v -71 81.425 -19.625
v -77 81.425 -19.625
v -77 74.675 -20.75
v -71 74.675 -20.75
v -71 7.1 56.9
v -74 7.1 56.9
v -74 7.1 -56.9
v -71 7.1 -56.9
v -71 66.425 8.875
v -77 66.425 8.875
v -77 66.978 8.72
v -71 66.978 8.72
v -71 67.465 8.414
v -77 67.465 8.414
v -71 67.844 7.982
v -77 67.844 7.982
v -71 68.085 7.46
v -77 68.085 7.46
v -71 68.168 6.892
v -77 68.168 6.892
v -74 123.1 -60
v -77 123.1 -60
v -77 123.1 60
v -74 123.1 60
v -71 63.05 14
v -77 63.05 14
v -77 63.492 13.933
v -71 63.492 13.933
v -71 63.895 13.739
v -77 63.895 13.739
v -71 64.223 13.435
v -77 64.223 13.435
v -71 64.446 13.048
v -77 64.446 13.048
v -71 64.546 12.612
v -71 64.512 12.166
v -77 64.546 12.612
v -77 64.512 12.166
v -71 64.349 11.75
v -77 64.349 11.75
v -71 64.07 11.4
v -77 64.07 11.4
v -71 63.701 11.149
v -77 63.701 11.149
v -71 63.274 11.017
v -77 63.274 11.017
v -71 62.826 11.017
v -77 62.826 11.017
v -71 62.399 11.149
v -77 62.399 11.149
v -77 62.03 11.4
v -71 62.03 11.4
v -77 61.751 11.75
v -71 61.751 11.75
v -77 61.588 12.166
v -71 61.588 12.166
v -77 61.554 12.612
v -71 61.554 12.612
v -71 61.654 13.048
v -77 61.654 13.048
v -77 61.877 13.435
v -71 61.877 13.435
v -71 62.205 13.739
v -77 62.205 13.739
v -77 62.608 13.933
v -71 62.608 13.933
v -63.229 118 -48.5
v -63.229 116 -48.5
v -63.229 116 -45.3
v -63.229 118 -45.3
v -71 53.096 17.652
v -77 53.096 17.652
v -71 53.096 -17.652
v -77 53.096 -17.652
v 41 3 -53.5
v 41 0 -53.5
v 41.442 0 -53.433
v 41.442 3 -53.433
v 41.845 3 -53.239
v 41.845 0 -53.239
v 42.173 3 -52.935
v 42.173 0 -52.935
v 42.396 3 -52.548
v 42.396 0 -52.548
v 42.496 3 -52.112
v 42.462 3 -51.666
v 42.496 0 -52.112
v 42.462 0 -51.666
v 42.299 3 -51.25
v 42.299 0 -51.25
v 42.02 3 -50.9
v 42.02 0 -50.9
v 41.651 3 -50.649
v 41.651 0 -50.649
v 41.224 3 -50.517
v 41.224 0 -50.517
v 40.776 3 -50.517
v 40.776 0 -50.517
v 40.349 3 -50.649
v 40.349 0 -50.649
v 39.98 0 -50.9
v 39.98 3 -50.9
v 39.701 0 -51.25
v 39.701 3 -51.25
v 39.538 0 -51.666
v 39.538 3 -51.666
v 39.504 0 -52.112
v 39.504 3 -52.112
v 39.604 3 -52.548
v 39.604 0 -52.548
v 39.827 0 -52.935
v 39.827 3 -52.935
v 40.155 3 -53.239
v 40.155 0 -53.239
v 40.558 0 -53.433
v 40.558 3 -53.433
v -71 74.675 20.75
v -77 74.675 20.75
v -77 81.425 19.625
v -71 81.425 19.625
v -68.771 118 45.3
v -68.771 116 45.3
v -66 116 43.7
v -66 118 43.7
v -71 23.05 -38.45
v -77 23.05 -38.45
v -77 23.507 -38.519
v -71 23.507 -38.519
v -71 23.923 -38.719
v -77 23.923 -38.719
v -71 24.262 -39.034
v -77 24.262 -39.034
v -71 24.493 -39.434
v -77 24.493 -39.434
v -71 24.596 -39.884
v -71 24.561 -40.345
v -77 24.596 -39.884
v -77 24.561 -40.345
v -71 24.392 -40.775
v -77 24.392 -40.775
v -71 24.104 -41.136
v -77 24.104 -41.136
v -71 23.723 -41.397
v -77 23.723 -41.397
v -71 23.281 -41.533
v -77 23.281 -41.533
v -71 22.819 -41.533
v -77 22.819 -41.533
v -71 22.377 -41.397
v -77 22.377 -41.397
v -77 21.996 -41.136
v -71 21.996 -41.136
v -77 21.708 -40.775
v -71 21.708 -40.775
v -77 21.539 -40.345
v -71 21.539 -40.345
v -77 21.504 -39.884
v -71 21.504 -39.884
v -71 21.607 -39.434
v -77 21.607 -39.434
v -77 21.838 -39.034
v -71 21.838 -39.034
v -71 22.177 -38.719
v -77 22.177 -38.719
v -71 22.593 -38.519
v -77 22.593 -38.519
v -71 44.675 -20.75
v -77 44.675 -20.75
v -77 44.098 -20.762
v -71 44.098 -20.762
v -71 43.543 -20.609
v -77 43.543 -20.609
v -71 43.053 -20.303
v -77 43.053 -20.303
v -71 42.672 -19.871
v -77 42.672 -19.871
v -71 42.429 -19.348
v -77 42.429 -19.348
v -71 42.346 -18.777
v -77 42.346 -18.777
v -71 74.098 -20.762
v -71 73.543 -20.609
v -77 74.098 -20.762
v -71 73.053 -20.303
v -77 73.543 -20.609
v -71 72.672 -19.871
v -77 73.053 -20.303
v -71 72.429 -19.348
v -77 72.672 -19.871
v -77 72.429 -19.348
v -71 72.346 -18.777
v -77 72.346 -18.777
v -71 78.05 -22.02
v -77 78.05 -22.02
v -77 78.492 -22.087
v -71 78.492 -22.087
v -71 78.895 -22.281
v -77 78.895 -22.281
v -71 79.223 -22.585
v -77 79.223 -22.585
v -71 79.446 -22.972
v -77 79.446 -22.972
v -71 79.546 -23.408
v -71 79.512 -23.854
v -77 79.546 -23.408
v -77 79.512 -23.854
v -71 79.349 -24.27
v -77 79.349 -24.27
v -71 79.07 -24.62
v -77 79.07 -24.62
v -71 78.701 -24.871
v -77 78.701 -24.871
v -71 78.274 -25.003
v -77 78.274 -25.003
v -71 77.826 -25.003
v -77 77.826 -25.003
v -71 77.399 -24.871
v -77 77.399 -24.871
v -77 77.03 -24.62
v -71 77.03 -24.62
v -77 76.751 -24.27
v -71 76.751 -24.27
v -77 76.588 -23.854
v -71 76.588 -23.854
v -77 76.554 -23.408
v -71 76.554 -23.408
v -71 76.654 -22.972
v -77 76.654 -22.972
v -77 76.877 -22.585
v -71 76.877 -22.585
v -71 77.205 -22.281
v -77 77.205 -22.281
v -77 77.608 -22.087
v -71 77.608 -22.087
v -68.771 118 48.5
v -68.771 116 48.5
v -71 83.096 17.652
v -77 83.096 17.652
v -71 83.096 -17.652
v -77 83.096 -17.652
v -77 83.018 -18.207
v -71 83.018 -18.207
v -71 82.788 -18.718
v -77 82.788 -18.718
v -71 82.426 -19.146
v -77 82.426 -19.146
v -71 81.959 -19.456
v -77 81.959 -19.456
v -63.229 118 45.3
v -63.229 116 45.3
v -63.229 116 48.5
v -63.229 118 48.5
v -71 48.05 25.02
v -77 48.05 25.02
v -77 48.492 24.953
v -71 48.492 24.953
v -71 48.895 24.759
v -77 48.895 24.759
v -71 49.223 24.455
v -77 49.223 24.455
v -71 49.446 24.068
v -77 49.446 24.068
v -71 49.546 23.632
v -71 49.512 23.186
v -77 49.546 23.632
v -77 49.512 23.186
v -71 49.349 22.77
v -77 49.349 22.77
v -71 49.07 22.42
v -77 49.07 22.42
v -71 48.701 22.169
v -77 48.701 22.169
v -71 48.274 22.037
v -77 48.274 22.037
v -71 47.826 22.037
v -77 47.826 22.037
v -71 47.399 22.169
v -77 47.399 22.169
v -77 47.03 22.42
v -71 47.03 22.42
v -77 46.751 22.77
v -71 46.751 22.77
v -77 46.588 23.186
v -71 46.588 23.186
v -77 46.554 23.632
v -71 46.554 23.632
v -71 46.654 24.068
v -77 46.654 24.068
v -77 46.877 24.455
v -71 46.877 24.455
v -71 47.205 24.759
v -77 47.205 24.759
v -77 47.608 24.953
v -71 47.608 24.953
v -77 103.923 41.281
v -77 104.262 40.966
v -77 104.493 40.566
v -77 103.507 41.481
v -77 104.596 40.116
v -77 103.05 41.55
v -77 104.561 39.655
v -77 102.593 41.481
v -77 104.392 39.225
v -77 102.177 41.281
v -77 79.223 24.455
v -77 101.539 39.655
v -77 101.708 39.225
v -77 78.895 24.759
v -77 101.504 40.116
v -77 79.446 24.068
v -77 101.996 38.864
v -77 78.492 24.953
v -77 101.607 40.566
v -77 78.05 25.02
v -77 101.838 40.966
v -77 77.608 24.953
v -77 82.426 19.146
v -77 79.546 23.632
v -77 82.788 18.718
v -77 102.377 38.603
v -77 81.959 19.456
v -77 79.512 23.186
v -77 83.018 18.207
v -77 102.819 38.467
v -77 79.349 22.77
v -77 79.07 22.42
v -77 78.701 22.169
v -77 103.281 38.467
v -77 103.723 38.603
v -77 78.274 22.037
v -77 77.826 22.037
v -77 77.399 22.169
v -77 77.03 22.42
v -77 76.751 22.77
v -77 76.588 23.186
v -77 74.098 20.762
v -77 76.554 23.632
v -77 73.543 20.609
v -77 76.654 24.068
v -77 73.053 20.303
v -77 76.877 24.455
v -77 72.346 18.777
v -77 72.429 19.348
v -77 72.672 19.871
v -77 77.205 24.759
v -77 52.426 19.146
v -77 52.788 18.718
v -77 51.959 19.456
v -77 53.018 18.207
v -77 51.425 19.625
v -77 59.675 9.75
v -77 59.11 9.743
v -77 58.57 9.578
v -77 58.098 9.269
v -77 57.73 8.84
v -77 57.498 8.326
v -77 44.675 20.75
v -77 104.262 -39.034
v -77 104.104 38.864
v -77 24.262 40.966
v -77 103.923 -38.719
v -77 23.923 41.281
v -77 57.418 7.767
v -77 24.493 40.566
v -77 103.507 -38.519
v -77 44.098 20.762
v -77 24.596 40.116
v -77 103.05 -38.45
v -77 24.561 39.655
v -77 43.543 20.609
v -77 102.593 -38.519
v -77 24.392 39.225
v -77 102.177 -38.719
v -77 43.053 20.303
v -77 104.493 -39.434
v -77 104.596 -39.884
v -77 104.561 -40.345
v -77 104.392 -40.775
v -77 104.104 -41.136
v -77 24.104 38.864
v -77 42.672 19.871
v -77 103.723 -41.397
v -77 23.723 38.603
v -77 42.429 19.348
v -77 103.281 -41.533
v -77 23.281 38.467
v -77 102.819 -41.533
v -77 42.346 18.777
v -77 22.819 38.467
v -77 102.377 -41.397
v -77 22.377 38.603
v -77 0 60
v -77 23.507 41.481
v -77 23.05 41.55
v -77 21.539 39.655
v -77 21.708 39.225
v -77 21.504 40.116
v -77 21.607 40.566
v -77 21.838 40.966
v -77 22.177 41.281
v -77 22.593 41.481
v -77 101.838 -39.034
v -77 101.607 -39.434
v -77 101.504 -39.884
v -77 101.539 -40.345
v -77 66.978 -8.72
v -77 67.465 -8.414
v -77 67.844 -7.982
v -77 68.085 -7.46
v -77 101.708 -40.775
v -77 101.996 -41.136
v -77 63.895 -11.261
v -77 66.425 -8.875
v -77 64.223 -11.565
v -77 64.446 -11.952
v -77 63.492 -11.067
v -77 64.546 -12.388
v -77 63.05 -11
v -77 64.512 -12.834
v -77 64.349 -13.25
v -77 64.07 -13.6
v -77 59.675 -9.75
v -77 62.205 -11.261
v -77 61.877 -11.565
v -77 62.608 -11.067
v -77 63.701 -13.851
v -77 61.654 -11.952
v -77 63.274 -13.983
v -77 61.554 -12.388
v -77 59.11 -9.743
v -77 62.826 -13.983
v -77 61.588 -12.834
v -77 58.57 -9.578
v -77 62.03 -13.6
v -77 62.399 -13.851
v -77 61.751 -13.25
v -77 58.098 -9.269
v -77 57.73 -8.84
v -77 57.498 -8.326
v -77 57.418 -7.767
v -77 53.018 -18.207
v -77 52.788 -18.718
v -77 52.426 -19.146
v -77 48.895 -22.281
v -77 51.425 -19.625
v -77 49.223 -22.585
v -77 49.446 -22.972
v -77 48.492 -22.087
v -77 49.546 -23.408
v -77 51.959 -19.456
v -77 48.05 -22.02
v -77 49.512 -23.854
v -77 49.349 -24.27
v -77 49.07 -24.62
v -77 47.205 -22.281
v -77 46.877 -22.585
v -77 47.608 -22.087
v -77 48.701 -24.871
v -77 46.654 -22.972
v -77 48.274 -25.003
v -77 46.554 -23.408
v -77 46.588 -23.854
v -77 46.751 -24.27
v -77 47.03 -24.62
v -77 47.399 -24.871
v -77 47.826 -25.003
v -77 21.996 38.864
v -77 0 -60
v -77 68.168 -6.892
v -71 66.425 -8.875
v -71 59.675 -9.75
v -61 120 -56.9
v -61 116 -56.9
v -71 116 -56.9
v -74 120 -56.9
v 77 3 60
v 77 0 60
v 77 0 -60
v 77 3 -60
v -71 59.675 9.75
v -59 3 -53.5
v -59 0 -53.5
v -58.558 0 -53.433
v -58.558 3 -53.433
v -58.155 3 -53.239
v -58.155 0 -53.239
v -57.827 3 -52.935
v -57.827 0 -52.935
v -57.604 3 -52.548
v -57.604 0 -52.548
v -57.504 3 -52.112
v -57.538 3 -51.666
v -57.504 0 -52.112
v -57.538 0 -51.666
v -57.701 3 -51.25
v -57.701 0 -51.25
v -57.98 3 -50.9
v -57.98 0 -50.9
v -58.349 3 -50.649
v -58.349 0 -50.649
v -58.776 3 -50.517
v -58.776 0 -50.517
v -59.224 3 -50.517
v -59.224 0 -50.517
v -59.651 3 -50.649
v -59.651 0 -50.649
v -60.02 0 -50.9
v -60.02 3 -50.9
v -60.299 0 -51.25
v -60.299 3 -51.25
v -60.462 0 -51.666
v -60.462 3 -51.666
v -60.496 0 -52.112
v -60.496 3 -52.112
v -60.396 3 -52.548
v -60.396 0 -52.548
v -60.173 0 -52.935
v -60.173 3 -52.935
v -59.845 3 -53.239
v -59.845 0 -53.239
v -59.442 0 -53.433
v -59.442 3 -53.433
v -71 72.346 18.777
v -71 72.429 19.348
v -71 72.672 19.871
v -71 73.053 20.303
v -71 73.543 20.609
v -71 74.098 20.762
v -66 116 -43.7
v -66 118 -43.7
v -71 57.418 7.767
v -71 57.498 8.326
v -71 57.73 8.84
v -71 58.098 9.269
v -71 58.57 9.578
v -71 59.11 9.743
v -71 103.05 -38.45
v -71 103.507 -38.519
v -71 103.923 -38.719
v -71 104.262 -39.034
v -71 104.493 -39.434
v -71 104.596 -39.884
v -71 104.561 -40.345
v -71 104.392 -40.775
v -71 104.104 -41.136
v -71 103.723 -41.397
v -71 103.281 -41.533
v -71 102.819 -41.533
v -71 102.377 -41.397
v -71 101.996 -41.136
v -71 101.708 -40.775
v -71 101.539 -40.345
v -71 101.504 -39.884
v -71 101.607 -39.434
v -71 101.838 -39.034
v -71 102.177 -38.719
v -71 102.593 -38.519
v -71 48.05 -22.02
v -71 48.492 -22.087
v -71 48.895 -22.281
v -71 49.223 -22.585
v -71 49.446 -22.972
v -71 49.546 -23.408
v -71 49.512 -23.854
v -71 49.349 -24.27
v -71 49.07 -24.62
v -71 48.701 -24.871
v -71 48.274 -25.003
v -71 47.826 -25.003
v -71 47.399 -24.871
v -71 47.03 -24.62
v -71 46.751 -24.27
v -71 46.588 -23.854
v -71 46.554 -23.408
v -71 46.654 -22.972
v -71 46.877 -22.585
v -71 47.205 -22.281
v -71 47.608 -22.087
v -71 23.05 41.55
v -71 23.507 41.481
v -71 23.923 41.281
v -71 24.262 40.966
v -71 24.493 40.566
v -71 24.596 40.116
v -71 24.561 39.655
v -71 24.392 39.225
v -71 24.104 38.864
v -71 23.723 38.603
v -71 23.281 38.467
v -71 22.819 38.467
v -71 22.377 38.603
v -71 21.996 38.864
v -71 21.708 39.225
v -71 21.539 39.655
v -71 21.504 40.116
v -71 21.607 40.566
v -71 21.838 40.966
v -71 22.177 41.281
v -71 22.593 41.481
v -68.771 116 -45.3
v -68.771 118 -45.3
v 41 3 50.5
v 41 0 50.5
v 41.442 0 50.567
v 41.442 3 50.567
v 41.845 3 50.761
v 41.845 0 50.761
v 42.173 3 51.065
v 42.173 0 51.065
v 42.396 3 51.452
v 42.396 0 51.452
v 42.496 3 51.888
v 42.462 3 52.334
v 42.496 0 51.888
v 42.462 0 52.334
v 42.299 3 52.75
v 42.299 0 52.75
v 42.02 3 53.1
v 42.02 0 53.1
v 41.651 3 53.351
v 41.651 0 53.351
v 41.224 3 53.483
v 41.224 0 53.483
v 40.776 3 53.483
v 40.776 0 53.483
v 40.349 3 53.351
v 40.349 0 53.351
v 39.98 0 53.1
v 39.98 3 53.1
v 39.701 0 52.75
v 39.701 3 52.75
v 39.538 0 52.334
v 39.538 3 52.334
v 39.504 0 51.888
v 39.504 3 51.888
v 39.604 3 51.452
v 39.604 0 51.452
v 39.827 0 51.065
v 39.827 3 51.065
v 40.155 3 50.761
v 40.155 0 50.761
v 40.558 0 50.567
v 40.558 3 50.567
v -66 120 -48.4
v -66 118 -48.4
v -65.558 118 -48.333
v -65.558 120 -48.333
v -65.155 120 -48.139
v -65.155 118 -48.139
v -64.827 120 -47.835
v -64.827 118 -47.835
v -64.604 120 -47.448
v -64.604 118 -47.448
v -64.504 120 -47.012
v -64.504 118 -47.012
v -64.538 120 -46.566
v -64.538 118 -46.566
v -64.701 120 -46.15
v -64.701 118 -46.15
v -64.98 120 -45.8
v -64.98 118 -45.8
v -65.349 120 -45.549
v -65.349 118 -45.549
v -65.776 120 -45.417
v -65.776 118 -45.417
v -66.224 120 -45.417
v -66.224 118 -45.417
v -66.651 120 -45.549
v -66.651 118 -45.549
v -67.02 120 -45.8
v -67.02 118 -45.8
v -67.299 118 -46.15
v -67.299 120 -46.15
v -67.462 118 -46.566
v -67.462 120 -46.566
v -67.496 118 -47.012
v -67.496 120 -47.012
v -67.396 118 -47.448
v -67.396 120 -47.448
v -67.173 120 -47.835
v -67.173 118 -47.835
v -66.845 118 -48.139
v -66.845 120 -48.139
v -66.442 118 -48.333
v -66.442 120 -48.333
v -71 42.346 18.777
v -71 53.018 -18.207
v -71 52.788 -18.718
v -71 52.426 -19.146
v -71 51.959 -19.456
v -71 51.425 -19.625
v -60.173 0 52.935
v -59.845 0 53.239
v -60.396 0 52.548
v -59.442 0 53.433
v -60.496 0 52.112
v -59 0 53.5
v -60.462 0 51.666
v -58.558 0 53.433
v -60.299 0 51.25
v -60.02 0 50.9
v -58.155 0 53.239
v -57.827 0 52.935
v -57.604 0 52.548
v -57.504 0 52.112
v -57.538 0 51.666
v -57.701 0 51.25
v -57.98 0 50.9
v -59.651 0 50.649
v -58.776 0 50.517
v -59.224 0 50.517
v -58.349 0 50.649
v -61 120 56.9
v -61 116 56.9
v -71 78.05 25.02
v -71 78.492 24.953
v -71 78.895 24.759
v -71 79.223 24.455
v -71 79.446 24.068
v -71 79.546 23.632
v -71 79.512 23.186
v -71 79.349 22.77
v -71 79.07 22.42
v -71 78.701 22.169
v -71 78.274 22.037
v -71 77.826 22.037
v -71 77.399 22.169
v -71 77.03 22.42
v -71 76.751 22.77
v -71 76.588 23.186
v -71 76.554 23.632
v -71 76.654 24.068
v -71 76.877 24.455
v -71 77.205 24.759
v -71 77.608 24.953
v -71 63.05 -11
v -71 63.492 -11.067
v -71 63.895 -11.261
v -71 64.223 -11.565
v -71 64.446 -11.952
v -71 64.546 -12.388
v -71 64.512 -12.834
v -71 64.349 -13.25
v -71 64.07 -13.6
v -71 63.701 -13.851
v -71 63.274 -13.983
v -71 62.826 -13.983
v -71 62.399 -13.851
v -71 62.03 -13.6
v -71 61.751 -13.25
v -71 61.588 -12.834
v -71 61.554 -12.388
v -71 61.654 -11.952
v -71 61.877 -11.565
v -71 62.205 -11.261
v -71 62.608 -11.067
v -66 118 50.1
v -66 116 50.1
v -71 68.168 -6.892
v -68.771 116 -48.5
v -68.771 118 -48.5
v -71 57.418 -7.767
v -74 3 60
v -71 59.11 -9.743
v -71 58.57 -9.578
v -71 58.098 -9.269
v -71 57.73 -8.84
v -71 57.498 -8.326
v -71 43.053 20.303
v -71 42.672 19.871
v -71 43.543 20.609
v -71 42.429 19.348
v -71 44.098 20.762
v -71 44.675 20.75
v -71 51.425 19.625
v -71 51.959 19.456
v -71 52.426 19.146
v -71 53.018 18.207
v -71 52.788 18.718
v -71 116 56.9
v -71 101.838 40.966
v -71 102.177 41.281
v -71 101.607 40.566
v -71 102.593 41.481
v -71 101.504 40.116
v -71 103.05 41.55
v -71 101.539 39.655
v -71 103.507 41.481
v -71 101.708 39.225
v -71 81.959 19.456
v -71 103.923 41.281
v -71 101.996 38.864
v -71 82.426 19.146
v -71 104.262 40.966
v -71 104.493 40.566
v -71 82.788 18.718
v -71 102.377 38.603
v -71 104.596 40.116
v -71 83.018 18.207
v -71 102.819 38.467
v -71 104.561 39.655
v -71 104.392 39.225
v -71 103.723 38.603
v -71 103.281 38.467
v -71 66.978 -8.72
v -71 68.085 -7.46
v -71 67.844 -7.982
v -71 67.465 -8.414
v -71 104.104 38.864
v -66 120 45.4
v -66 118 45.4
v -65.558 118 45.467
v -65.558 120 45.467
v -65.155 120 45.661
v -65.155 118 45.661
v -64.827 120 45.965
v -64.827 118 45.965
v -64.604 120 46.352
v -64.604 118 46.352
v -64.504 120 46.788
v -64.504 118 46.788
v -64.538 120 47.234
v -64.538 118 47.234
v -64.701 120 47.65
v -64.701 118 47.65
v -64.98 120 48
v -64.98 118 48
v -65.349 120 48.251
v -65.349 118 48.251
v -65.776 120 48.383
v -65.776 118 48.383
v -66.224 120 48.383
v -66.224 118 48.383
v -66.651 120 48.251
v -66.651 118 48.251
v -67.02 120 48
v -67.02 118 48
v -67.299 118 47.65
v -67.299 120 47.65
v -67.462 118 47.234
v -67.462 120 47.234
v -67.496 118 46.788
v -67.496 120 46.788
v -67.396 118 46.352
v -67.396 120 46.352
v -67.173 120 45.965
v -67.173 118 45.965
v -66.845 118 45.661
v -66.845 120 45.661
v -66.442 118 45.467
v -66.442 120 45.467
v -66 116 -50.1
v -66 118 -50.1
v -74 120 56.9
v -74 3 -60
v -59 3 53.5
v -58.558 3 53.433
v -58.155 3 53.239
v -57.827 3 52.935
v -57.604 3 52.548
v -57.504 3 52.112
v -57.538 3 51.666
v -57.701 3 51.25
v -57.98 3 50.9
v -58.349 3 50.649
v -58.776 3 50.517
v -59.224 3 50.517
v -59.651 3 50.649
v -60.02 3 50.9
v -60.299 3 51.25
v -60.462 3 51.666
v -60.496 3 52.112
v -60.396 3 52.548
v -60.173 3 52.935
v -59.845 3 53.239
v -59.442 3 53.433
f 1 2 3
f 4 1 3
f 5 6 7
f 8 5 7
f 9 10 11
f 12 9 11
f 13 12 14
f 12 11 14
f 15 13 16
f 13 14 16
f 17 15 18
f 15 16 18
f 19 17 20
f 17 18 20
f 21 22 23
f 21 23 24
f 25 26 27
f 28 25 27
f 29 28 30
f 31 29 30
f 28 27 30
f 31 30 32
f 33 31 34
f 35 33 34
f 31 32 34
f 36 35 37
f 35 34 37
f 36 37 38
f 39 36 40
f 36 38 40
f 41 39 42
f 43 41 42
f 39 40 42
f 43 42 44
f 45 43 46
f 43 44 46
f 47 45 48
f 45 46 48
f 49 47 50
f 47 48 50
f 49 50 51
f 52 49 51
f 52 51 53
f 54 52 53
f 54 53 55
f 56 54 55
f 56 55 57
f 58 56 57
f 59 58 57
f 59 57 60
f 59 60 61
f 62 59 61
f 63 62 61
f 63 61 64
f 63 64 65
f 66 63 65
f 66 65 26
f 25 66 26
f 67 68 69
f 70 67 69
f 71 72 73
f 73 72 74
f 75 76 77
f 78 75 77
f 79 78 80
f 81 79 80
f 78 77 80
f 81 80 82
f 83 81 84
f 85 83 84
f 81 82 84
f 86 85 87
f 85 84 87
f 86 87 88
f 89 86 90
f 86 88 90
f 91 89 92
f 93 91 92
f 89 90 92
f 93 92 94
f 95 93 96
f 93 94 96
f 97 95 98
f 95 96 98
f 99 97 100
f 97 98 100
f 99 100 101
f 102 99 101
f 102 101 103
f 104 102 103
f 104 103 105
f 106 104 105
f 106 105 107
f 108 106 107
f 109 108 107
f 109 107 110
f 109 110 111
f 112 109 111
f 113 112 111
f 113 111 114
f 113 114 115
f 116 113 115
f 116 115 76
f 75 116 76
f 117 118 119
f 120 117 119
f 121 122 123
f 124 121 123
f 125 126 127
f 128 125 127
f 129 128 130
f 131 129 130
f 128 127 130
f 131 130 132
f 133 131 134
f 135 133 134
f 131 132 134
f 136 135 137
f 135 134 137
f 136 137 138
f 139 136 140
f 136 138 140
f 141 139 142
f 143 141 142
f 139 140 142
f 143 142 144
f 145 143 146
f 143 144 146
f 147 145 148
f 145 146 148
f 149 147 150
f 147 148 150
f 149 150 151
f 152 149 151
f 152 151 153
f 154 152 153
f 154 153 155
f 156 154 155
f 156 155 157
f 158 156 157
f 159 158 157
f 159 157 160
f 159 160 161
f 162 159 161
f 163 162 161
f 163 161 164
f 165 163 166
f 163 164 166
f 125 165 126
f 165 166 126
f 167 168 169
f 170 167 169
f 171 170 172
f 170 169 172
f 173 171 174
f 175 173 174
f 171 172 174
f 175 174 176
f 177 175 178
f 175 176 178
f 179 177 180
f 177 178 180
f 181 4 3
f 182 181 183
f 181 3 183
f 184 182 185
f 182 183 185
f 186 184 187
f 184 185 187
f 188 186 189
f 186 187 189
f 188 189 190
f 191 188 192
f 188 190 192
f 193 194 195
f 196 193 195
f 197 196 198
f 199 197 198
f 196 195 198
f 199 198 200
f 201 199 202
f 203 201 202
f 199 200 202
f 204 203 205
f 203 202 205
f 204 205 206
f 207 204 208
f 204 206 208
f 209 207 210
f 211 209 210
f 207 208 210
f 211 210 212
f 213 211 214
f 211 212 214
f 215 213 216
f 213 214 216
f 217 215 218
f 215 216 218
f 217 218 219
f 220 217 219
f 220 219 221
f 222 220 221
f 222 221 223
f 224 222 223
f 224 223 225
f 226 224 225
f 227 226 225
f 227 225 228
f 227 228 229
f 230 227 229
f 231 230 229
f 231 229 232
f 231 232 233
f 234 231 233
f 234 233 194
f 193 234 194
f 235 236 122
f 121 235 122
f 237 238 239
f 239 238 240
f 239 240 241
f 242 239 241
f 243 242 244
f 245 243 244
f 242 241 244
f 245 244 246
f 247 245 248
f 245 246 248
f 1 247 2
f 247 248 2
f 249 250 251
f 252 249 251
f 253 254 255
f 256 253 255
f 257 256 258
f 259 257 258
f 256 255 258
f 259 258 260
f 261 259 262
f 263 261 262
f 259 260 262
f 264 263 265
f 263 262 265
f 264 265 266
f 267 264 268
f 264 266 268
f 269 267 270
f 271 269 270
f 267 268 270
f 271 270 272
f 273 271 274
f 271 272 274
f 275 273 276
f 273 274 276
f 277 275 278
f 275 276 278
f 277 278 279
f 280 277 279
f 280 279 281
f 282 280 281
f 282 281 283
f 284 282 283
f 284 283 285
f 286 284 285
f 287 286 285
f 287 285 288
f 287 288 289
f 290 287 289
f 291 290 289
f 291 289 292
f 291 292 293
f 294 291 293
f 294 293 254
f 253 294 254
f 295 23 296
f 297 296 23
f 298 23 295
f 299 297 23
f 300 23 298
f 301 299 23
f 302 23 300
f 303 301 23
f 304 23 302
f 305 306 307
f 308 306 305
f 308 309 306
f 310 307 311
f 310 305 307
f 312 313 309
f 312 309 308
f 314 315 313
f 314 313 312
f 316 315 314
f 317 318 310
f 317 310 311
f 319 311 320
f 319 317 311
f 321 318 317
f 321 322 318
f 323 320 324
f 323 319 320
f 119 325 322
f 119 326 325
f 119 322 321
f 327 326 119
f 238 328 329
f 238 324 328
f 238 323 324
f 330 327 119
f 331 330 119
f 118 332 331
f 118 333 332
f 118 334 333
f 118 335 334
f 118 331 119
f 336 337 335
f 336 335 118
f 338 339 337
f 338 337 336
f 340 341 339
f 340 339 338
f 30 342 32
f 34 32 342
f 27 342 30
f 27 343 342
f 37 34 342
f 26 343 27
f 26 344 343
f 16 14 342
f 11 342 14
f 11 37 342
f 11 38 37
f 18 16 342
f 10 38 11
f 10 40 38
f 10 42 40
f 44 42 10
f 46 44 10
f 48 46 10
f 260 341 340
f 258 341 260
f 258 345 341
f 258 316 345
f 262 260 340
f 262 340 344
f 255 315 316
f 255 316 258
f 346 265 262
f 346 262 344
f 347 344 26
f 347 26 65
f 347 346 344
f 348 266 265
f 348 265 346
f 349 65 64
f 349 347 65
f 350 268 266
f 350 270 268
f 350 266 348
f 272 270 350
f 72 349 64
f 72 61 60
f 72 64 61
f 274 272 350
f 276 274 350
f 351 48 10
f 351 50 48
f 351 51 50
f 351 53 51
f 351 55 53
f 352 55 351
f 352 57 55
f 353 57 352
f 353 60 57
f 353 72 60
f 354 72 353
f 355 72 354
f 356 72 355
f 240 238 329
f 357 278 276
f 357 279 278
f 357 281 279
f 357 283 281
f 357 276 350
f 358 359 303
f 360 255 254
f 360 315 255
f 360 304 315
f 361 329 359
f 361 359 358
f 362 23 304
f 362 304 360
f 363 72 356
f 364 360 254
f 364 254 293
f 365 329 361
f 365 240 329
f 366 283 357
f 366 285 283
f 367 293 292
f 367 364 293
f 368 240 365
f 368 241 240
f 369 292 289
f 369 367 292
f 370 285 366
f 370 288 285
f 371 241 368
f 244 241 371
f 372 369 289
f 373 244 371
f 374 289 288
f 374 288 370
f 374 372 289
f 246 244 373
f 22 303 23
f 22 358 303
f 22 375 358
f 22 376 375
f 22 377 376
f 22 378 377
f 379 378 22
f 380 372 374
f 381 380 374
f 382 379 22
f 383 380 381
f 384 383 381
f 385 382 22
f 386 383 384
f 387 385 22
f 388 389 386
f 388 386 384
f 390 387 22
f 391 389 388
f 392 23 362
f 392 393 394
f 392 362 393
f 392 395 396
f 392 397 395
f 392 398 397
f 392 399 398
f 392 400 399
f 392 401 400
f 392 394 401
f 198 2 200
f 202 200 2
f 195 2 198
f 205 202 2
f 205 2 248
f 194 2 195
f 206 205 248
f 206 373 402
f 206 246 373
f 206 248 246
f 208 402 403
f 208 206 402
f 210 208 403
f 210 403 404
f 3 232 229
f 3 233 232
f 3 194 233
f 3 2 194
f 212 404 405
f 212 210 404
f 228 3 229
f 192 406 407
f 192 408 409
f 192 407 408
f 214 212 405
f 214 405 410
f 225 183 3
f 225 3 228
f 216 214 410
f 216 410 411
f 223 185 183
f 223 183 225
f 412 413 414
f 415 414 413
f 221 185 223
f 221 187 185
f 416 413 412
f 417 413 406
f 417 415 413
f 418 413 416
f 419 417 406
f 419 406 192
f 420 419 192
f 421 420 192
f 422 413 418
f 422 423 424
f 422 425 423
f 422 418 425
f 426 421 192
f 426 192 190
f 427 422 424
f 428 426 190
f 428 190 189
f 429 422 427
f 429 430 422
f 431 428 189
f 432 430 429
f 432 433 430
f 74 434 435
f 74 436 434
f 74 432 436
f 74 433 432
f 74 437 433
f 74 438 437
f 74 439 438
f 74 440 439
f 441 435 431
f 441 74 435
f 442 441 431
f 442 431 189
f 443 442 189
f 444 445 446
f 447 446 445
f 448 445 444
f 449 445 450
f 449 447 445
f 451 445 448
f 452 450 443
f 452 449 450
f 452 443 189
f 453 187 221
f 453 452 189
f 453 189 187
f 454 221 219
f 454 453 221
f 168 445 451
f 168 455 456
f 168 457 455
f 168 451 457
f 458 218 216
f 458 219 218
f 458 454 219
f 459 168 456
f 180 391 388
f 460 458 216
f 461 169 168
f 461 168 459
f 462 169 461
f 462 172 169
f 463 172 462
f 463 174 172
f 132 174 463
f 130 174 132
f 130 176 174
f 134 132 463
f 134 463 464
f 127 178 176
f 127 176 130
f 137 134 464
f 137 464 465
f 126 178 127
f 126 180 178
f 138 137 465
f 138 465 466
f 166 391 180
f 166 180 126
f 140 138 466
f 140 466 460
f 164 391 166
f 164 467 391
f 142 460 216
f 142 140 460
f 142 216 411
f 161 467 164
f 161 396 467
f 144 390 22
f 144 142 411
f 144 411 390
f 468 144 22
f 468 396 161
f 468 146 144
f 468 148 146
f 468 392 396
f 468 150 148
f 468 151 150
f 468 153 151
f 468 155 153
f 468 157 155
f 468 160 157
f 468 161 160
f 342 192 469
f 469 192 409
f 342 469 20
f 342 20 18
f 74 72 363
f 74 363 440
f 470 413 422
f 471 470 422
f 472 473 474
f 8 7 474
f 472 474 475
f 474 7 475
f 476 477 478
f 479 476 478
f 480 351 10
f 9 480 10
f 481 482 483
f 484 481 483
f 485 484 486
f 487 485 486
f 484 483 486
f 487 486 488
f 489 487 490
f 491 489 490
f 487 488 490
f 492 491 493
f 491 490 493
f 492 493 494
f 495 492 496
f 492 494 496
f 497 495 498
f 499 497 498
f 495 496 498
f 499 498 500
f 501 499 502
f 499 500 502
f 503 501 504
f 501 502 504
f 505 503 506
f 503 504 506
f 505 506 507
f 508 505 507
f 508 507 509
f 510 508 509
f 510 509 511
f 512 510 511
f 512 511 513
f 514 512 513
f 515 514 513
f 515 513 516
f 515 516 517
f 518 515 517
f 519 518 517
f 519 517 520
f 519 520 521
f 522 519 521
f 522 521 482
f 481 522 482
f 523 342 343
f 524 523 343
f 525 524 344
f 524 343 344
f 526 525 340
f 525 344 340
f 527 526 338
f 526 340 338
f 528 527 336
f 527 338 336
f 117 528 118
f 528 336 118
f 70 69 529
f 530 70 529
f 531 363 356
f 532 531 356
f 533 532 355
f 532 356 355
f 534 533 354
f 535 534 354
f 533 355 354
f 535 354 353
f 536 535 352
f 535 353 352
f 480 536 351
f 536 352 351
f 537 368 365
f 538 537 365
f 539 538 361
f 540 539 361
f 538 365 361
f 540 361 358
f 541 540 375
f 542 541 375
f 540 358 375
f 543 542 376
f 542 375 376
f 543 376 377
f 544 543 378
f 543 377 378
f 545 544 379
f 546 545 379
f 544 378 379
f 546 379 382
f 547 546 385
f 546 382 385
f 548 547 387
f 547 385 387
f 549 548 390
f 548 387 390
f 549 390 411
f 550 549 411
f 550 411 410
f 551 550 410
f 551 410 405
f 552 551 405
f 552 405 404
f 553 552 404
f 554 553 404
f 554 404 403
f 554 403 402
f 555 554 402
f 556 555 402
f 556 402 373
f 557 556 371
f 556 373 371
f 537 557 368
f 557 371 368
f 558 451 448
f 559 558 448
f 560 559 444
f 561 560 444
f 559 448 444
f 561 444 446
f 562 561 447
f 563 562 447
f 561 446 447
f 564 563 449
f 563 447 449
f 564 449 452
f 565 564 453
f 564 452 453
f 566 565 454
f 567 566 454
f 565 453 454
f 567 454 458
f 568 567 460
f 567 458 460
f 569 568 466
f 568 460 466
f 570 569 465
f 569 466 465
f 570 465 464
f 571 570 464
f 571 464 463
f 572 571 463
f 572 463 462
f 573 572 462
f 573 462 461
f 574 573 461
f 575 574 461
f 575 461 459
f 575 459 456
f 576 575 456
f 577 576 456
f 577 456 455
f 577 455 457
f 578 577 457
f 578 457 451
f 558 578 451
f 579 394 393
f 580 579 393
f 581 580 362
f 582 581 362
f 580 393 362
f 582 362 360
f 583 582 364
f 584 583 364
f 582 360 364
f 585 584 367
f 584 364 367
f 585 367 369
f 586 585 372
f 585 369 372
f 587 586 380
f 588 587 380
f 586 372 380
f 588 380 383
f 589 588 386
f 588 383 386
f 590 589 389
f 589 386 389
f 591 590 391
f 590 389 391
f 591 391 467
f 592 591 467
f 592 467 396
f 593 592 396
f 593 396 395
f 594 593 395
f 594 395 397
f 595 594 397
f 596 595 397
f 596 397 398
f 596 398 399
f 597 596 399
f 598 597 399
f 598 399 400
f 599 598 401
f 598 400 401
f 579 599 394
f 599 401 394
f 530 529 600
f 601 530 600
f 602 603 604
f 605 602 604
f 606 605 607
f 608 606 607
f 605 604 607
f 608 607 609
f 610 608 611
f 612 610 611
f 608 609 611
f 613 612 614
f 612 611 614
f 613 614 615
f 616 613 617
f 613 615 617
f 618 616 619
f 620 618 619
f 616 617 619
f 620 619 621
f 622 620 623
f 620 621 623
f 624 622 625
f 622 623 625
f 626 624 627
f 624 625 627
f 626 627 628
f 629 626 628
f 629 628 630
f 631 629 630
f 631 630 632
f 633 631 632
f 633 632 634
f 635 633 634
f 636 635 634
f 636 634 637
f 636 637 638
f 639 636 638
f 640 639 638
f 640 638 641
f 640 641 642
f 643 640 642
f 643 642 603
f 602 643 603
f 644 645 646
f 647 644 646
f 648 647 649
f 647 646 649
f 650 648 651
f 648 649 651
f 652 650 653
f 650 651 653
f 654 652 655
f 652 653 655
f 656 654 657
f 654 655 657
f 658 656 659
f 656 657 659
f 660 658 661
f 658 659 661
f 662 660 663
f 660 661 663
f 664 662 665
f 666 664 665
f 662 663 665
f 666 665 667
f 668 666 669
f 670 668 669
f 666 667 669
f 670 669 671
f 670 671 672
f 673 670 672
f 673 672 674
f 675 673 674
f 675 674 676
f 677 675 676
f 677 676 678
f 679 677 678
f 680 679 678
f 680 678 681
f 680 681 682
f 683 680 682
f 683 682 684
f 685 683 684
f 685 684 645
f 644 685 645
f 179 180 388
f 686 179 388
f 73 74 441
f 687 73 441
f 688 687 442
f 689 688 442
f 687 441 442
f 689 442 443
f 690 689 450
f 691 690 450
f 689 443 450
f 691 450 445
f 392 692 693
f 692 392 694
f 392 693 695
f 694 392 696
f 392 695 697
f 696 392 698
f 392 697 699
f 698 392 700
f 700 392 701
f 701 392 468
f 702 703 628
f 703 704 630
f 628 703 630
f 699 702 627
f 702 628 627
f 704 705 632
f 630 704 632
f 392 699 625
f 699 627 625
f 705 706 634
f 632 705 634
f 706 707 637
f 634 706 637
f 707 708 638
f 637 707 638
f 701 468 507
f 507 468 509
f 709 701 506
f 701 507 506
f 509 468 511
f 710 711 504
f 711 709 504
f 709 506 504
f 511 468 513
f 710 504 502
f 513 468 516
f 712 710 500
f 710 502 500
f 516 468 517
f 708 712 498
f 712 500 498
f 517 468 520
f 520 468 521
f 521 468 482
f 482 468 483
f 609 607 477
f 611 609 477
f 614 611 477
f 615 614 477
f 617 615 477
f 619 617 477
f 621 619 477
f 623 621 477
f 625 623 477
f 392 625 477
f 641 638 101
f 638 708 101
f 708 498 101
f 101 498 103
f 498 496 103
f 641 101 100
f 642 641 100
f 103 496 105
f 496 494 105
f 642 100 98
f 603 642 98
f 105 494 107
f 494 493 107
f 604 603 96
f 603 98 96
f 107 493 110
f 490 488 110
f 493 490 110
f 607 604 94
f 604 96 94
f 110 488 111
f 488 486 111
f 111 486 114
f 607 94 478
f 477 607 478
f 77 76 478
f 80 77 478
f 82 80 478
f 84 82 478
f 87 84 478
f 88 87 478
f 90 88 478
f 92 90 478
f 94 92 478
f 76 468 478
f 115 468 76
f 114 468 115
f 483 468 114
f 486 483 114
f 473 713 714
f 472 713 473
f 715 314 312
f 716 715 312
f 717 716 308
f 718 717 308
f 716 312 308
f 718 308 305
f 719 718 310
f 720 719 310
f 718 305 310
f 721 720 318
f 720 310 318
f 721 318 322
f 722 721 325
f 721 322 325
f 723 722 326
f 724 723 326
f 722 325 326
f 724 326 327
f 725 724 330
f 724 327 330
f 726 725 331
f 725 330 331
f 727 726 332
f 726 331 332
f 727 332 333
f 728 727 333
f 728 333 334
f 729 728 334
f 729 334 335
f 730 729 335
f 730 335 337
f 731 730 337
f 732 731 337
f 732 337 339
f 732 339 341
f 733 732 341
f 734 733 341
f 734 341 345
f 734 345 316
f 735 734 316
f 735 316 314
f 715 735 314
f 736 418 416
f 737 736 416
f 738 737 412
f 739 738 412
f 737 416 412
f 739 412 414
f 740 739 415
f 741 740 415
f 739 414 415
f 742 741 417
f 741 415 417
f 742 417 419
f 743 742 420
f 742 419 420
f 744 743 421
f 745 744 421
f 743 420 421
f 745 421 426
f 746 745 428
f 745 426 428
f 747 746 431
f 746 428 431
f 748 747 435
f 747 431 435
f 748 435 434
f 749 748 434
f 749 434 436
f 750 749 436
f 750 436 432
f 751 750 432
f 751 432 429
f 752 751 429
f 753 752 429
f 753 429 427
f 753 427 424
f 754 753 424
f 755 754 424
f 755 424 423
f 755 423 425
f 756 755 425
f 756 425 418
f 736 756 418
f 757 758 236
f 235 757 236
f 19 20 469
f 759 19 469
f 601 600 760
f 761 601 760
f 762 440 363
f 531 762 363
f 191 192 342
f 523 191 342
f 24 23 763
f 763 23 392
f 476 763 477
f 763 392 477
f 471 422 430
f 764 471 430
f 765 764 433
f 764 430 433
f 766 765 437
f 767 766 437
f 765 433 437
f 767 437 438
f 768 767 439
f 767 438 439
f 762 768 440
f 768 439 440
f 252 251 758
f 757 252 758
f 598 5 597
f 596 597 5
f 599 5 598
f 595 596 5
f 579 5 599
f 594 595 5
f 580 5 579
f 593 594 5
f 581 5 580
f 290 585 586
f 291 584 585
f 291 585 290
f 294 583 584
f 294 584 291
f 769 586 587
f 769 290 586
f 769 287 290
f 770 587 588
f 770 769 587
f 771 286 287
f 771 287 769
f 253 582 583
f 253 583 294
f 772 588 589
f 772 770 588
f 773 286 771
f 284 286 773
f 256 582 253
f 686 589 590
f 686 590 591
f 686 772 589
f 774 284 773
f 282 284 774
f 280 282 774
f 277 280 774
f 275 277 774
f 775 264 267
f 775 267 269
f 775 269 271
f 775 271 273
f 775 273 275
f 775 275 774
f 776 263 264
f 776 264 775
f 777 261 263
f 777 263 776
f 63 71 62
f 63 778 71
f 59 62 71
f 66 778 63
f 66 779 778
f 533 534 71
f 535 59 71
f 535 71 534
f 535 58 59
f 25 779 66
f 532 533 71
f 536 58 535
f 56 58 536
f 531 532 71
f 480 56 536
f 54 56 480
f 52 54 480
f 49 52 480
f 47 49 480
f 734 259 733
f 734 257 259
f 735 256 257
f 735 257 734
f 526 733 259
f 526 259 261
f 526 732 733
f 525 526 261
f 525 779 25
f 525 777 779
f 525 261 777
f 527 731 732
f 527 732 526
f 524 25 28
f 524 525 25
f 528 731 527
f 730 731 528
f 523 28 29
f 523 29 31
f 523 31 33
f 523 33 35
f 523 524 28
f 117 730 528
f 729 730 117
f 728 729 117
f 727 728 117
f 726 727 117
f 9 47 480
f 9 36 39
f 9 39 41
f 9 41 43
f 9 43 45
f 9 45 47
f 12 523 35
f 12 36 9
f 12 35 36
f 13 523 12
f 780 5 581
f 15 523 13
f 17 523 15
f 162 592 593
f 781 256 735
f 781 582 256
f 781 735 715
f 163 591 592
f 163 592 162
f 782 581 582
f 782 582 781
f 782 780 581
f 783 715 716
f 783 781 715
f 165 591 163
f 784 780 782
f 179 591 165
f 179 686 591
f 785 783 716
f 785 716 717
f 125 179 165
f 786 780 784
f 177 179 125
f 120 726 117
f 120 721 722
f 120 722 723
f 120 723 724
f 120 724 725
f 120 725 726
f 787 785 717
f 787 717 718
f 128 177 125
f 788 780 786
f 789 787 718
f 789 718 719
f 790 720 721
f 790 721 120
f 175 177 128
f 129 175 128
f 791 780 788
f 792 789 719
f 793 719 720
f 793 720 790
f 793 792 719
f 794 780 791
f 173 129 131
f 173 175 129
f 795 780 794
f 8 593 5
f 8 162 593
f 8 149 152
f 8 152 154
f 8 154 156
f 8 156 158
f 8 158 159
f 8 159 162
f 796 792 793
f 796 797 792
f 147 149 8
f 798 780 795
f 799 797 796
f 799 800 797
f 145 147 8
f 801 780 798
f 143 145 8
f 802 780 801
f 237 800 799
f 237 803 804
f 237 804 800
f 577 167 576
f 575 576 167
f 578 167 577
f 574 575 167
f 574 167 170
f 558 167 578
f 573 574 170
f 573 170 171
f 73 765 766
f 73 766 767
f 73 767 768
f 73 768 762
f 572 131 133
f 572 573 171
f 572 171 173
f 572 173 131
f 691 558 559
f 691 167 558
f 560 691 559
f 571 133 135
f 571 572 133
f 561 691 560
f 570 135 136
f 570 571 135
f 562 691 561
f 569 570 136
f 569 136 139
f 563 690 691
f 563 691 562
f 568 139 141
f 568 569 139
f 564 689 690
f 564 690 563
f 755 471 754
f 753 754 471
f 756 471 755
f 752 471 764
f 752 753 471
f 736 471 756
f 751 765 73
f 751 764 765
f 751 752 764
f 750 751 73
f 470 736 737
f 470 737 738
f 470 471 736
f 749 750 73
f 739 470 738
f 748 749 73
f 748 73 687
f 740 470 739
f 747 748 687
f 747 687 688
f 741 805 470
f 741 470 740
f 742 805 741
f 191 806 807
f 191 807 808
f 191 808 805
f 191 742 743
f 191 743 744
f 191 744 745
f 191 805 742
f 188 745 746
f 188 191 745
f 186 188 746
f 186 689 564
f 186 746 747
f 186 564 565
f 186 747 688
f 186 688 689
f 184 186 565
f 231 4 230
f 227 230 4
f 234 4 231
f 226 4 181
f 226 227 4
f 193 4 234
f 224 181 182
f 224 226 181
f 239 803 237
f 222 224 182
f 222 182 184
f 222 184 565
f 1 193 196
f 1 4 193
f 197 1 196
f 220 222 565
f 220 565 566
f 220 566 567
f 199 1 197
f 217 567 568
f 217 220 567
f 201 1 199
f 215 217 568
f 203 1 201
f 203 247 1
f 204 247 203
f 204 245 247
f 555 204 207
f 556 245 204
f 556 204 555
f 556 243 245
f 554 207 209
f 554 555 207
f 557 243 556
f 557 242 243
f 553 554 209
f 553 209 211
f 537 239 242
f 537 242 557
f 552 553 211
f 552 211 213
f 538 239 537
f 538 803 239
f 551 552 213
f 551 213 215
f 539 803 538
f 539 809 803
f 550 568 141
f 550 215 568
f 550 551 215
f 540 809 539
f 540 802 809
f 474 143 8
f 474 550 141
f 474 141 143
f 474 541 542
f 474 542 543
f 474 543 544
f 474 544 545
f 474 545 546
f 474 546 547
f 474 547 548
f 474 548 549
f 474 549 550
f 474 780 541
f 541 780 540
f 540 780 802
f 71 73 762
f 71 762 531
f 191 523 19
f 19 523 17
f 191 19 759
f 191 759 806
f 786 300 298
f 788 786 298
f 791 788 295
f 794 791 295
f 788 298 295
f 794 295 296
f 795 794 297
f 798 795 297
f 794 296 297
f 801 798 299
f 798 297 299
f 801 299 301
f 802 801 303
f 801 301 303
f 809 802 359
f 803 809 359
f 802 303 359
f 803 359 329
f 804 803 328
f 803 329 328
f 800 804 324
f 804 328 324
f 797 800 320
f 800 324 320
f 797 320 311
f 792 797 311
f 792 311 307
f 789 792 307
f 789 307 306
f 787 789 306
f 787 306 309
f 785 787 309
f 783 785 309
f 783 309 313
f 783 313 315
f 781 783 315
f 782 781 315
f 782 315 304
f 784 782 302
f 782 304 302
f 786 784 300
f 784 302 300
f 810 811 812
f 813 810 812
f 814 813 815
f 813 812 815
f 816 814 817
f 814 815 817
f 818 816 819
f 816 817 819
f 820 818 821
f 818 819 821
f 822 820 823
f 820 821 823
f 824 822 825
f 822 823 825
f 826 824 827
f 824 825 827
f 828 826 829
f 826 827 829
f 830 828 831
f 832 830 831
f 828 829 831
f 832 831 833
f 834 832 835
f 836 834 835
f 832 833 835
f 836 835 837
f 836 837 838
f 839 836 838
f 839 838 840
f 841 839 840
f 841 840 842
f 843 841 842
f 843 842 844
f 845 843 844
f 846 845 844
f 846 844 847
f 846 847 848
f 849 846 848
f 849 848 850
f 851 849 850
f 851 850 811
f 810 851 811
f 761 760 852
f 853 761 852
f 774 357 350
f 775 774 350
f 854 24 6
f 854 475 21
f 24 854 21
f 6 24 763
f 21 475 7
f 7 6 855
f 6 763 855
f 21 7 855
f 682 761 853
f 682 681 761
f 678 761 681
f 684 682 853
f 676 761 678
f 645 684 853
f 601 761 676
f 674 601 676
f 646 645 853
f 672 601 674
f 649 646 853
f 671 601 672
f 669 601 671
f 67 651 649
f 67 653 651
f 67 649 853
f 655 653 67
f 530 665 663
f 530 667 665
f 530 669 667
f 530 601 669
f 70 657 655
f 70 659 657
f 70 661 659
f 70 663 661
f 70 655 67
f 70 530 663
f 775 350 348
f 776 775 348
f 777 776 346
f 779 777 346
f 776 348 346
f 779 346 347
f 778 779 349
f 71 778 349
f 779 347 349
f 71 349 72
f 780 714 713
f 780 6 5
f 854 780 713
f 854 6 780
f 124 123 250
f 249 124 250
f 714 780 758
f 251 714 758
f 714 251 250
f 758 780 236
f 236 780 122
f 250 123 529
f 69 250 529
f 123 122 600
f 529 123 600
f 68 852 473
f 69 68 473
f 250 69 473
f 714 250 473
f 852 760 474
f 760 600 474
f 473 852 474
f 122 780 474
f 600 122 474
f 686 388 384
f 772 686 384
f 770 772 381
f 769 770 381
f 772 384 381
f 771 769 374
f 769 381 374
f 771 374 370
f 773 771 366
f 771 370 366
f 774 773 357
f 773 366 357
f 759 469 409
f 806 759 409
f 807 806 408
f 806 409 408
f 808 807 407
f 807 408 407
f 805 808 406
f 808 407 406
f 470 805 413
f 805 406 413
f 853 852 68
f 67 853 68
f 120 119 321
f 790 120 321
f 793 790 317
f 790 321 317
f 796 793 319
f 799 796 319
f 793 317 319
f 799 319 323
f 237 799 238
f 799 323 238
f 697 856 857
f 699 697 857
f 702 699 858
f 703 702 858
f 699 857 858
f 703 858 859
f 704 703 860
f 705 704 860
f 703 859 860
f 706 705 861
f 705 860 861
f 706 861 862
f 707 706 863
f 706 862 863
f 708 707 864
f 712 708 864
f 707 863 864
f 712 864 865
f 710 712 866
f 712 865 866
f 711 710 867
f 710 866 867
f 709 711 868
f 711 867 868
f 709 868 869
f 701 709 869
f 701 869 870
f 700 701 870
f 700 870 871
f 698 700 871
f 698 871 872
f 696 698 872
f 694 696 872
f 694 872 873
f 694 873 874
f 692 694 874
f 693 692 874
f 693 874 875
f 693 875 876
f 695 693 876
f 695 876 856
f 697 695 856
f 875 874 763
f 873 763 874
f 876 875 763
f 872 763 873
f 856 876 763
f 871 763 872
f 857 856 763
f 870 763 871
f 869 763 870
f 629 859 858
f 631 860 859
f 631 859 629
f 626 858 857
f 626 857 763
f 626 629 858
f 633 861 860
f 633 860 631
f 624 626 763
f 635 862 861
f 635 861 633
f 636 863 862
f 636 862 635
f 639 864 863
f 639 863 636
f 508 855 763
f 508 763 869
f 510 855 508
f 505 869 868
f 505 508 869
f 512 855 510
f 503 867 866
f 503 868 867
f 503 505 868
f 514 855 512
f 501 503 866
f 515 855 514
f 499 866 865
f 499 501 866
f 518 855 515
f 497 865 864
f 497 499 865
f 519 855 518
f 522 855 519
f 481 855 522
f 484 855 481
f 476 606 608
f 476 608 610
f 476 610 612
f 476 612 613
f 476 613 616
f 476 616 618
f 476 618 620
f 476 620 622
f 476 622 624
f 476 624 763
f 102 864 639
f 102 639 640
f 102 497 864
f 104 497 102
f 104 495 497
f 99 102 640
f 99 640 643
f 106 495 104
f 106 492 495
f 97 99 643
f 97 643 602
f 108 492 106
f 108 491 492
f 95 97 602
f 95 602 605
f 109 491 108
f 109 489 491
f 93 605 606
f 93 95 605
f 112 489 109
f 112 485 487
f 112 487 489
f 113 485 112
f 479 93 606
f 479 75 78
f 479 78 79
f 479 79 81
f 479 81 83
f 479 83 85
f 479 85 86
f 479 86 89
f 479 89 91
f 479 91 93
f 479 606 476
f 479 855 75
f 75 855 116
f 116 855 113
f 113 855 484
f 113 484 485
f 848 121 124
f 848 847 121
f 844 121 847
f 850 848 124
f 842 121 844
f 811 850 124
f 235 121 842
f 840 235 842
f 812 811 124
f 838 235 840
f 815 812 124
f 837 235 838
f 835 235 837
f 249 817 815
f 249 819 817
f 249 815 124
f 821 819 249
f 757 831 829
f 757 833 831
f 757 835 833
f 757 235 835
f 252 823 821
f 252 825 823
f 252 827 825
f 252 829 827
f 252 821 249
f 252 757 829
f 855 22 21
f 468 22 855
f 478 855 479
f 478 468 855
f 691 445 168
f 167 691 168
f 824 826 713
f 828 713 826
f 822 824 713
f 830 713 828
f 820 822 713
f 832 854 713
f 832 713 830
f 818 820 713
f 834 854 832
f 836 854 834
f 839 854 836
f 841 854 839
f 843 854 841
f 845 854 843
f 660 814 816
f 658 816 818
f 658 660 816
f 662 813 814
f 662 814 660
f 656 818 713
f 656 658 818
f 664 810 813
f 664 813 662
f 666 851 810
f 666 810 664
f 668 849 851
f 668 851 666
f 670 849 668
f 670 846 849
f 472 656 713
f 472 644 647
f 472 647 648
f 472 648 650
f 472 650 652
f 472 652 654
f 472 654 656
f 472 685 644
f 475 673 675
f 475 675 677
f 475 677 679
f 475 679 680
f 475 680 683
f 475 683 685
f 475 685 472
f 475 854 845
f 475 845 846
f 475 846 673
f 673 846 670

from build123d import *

# Parameters (mm, degrees)
SKETCH1_W              = 154
SKETCH1_H              = 120
LARGE_WALL_OUTER_DEPTH = 3
SKETCH8_W              = 3
SKETCH8_H              = 120
SMALL_WALL_OUTER_DEPTH = 120.1
SKETCH10_W             = 113.8
SKETCH10_H             = 112.9
SMALL_WALL_INNER_DEPTH = 3
SKETCH14_W             = 113.8
SKETCH14_H             = 4
MOUNT_DEPTH            = 10
MOUNTING_NUTS_DEPTH    = 2
NUT_1_BOLT_HOLE_REACH  = 155.144
SKETCH18_R             = 1.5
NUT_2_BOLT_HOLE_REACH  = 155.144
SKETCH19_R             = 1.5
CONNECTOR_SLOTS_REACH  = 208.082
SKETCH23_R             = 1.5
SKETCH27_R             = 1.55
SKETCH27_R_2           = 1.5
PCB_MOUNT_HOLES_DEPTH  = 6
SKETCH28_R             = 1.5
BOLT_HOLE1_DEPTH       = 10
SKETCH29_R             = 1.5
BOLT_HOLE2_DEPTH       = 10
SKETCH30_R             = 1.5
BOLT_HOLES34_DEPTH     = 10


with BuildPart() as part:
    # Sketch1 → Large-Wall-Outer (new body)
    with BuildSketch(Plane(origin=(0, 0, 0), x_dir=(1, 0, 0), z_dir=(0, 1, 0))):
        Rectangle(SKETCH1_W, SKETCH1_H)
    extrude(amount=LARGE_WALL_OUTER_DEPTH)

    # Sketch8 → Small-Wall-Outer (add)
    with BuildSketch(Plane(origin=(0, 3, 0), x_dir=(1, 0, 0), z_dir=(0, 1, 0))):
        with Locations((-75.5, 0)):
            Rectangle(SKETCH8_W, SKETCH8_H)
    extrude(amount=SMALL_WALL_OUTER_DEPTH)

    # Sketch10 → Small-Wall-Inner (add)
    with BuildSketch(Plane(origin=(-74, 0, 0), x_dir=(0, 0, -1), z_dir=(1, 0, 0))):
        with Locations((0, 63.55)):
            Rectangle(SKETCH10_W, SKETCH10_H)
    extrude(amount=SMALL_WALL_INNER_DEPTH)

    # Sketch14 → Mount (add)
    with BuildSketch(Plane(origin=(-71, 0, 0), x_dir=(0, 0, -1), z_dir=(1, 0, 0))):
        with Locations((0, 118)):
            Rectangle(SKETCH14_W, SKETCH14_H)
    extrude(amount=MOUNT_DEPTH)

    # Sketch17 → Mounting-Nuts (cut)
    with BuildSketch(Plane.XZ.offset(-116)):
        Polygon((-66, 43.7), (-63.228718708, 45.3), (-63.228718708, 48.5), (-66, 50.1), (-68.771281292, 48.5), (-68.771281292, 45.3), align=None)
        Polygon((-66, -50.1), (-63.228718708, -48.5), (-63.228718708, -45.3), (-66, -43.7), (-68.771281292, -45.3), (-68.771281292, -48.5), align=None)
    extrude(amount=-MOUNTING_NUTS_DEPTH, mode=Mode.SUBTRACT)

    # Sketch18 → Nut-1-Bolt-Hole (cut, up to next)
    with BuildSketch(Plane.XZ.offset(-118), mode=Mode.PRIVATE) as nut_1_bolt_hole_sk1:
        with Locations(Location((-66, 46.9, 0), (0, 0, 270))):
            Circle(SKETCH18_R)
    nut_1_bolt_hole_tool1 = extrude(nut_1_bolt_hole_sk1.sketch, amount=-NUT_1_BOLT_HOLE_REACH, mode=Mode.PRIVATE) & part.part
    add(nut_1_bolt_hole_tool1.solids().sort_by_distance((-66, 118, 46.9))[0], mode=Mode.SUBTRACT)

    # Sketch19 → Nut-2-Bolt-Hole (cut, up to next)
    with BuildSketch(Plane.XZ.offset(-118), mode=Mode.PRIVATE) as nut_2_bolt_hole_sk1:
        with Locations(Location((-66, -46.9, 0), (0, 0, 270))):
            Circle(SKETCH19_R)
    nut_2_bolt_hole_tool1 = extrude(nut_2_bolt_hole_sk1.sketch, amount=-NUT_2_BOLT_HOLE_REACH, mode=Mode.PRIVATE) & part.part
    add(nut_2_bolt_hole_tool1.solids().sort_by_distance((-66, 118, -46.9))[0], mode=Mode.SUBTRACT)

    # Sketch23 → Connector-Slots (cut, up to next)
    with BuildSketch(Plane(origin=(-77, 0, 0), x_dir=(0, 0, -1), z_dir=(-1, 0, 0)), mode=Mode.PRIVATE) as connector_slots_sk1:
        with Locations(Location((-12.5, -63.05, 0), (0, 0, 180))):
            Circle(SKETCH23_R)
    connector_slots_tool1 = extrude(connector_slots_sk1.sketch, amount=-CONNECTOR_SLOTS_REACH, mode=Mode.PRIVATE) & part.part
    # Sketch23 → Connector-Slots (cut, up to next)
    with BuildSketch(Plane(origin=(-77, 0, 0), x_dir=(0, 0, -1), z_dir=(-1, 0, 0)), mode=Mode.PRIVATE) as connector_slots_sk2:
        with Locations(Location((12.5, -63.05, 0), (0, 0, 180))):
            Circle(SKETCH23_R)
    connector_slots_tool2 = extrude(connector_slots_sk2.sketch, amount=-CONNECTOR_SLOTS_REACH, mode=Mode.PRIVATE) & part.part
    # Sketch23 → Connector-Slots (cut, up to next)
    with BuildSketch(Plane(origin=(-77, 0, 0), x_dir=(0, 0, -1), z_dir=(-1, 0, 0)), mode=Mode.PRIVATE) as connector_slots_sk3:
        with Locations(Location((-23.52, -78.05, 0), (0, 0, 180))):
            Circle(SKETCH23_R)
    connector_slots_tool3 = extrude(connector_slots_sk3.sketch, amount=-CONNECTOR_SLOTS_REACH, mode=Mode.PRIVATE) & part.part
    # Sketch23 → Connector-Slots (cut, up to next)
    with BuildSketch(Plane(origin=(-77, 0, 0), x_dir=(0, 0, -1), z_dir=(-1, 0, 0)), mode=Mode.PRIVATE) as connector_slots_sk4:
        with Locations(Location((23.52, -78.05, 0), (0, 0, 180))):
            Circle(SKETCH23_R)
    connector_slots_tool4 = extrude(connector_slots_sk4.sketch, amount=-CONNECTOR_SLOTS_REACH, mode=Mode.PRIVATE) & part.part
    # Sketch23 → Connector-Slots (cut, up to next)
    with BuildSketch(Plane(origin=(-77, 0, 0), x_dir=(0, 0, -1), z_dir=(-1, 0, 0)), mode=Mode.PRIVATE) as connector_slots_sk5:
        with Locations(Location((-23.52, -48.05, 0), (0, 0, 180))):
            Circle(SKETCH23_R)
    connector_slots_tool5 = extrude(connector_slots_sk5.sketch, amount=-CONNECTOR_SLOTS_REACH, mode=Mode.PRIVATE) & part.part
    # Sketch23 → Connector-Slots (cut, up to next)
    with BuildSketch(Plane(origin=(-77, 0, 0), x_dir=(0, 0, -1), z_dir=(-1, 0, 0)), mode=Mode.PRIVATE) as connector_slots_sk6:
        with Locations(Location((23.52, -48.05, 0), (0, 0, 180))):
            Circle(SKETCH23_R)
    connector_slots_tool6 = extrude(connector_slots_sk6.sketch, amount=-CONNECTOR_SLOTS_REACH, mode=Mode.PRIVATE) & part.part
    # Sketch23 → Connector-Slots (cut, up to next)
    with BuildSketch(Plane(origin=(-77, 0, 0), x_dir=(0, 0, -1), z_dir=(-1, 0, 0)), mode=Mode.PRIVATE) as connector_slots_sk7:
        with BuildLine():
            Line((-6.891594987, -68.167891943), (6.891594987, -68.167891943))
            ThreePointArc((6.891594987, -68.167891943), (8.211781315, -67.670259427), (8.875, -66.425))
            Line((8.875, -66.425), (9.75, -59.675))
            ThreePointArc((9.75, -59.675), (9.268962471, -58.097705614), (7.766594987, -57.417891943))
            Line((7.766594987, -57.417891943), (-7.766594987, -57.417891943))
            ThreePointArc((-7.766594987, -57.417891943), (-9.268962471, -58.097705614), (-9.75, -59.675))
            Line((-9.75, -59.675), (-8.875, -66.425))
            ThreePointArc((-8.875, -66.425), (-8.211781315, -67.670259427), (-6.891594987, -68.167891943))
        make_face()
    connector_slots_tool7 = extrude(connector_slots_sk7.sketch, amount=-CONNECTOR_SLOTS_REACH, mode=Mode.PRIVATE) & part.part
    # Sketch23 → Connector-Slots (cut, up to next)
    with BuildSketch(Plane(origin=(-77, 0, 0), x_dir=(0, 0, -1), z_dir=(-1, 0, 0)), mode=Mode.PRIVATE) as connector_slots_sk8:
        with BuildLine():
            Line((-17.652212152, -83.096202025), (17.652212152, -83.096202025))
            ThreePointArc((17.652212152, -83.096202025), (18.944961945, -82.62224199), (19.625, -81.425))
            Line((19.625, -81.425), (20.75, -74.675))
            ThreePointArc((20.75, -74.675), (20.303252117, -73.053452233), (18.777212152, -72.346202025))
            Line((18.777212152, -72.346202025), (-18.777212152, -72.346202025))
            ThreePointArc((-18.777212152, -72.346202025), (-20.303252117, -73.053452233), (-20.75, -74.675))
            Line((-20.75, -74.675), (-19.625, -81.425))
            ThreePointArc((-19.625, -81.425), (-18.944961945, -82.62224199), (-17.652212152, -83.096202025))
        make_face()
    connector_slots_tool8 = extrude(connector_slots_sk8.sketch, amount=-CONNECTOR_SLOTS_REACH, mode=Mode.PRIVATE) & part.part
    # Sketch23 → Connector-Slots (cut, up to next)
    with BuildSketch(Plane(origin=(-77, 0, 0), x_dir=(0, 0, -1), z_dir=(-1, 0, 0)), mode=Mode.PRIVATE) as connector_slots_sk9:
        with BuildLine():
            Line((-17.652212152, -53.096202025), (17.652212152, -53.096202025))
            ThreePointArc((17.652212152, -53.096202025), (18.944961945, -52.62224199), (19.625, -51.425))
            Line((19.625, -51.425), (20.75, -44.675))
            ThreePointArc((20.75, -44.675), (20.303252117, -43.053452233), (18.777212152, -42.346202025))
            Line((18.777212152, -42.346202025), (-18.777212152, -42.346202025))
            ThreePointArc((-18.777212152, -42.346202025), (-20.303252117, -43.053452233), (-20.75, -44.675))
            Line((-20.75, -44.675), (-19.625, -51.425))
            ThreePointArc((-19.625, -51.425), (-18.944961945, -52.62224199), (-17.652212152, -53.096202025))
        make_face()
    connector_slots_tool9 = extrude(connector_slots_sk9.sketch, amount=-CONNECTOR_SLOTS_REACH, mode=Mode.PRIVATE) & part.part
    add(connector_slots_tool1.solids().sort_by_distance((-77, 63.05, 12.5))[0], mode=Mode.SUBTRACT)
    add(connector_slots_tool2.solids().sort_by_distance((-77, 63.05, -12.5))[0], mode=Mode.SUBTRACT)
    add(connector_slots_tool3.solids().sort_by_distance((-77, 78.05, 23.52))[0], mode=Mode.SUBTRACT)
    add(connector_slots_tool4.solids().sort_by_distance((-77, 78.05, -23.52))[0], mode=Mode.SUBTRACT)
    add(connector_slots_tool5.solids().sort_by_distance((-77, 48.05, 23.52))[0], mode=Mode.SUBTRACT)
    add(connector_slots_tool6.solids().sort_by_distance((-77, 48.05, -23.52))[0], mode=Mode.SUBTRACT)
    add(connector_slots_tool7.solids().sort_by_distance((-77, 62.681741, 0))[0], mode=Mode.SUBTRACT)
    add(connector_slots_tool8.solids().sort_by_distance((-77, 77.655881, 0))[0], mode=Mode.SUBTRACT)
    add(connector_slots_tool9.solids().sort_by_distance((-77, 47.655881, 0))[0], mode=Mode.SUBTRACT)

    # Sketch27 → PCB-Mount-Holes (cut)
    with BuildSketch(Plane.ZY.offset(77)):
        with Locations((-40, 23.05)):
            Circle(SKETCH27_R)
        with Locations((12.5, 63.05)):
            Circle(SKETCH27_R_2)
        with Locations((-12.5, 63.05)):
            Circle(SKETCH27_R_2)
        with Locations((40, 23.05)):
            Circle(SKETCH27_R)
        with Locations((40, 103.05)):
            Circle(SKETCH27_R)
        with Locations((-40, 103.05)):
            Circle(SKETCH27_R)
    extrude(amount=-PCB_MOUNT_HOLES_DEPTH, mode=Mode.SUBTRACT)

    # Sketch28 → bolt-hole1 (cut)
    with BuildSketch(Plane(origin=(0, 3, 0), x_dir=(1, 0, 0), z_dir=(0, 1, 0))):
        with Locations(Location((-59, -52, 0), (0, 0, 270))):
            Circle(SKETCH28_R)
    extrude(amount=-BOLT_HOLE1_DEPTH, mode=Mode.SUBTRACT)

    # Sketch29 → bolt-hole2 (cut)
    with BuildSketch(Plane(origin=(0, 0, 0), x_dir=(-1, 0, 0), z_dir=(0, -1, 0))):
        with Locations(Location((-41, -52, 0), (0, 0, 90))):
            Circle(SKETCH29_R)
    extrude(amount=-BOLT_HOLE2_DEPTH, mode=Mode.SUBTRACT)

    # Sketch30 → bolt-holes34 (cut)
    with BuildSketch(Plane.XZ):
        with Locations(Location((-59, -52, 0), (0, 0, 270))):
            Circle(SKETCH30_R)
        with Locations(Location((41, -52, 0), (0, 0, 270))):
            Circle(SKETCH30_R)
    extrude(amount=-BOLT_HOLES34_DEPTH, mode=Mode.SUBTRACT)


solid = part.part
